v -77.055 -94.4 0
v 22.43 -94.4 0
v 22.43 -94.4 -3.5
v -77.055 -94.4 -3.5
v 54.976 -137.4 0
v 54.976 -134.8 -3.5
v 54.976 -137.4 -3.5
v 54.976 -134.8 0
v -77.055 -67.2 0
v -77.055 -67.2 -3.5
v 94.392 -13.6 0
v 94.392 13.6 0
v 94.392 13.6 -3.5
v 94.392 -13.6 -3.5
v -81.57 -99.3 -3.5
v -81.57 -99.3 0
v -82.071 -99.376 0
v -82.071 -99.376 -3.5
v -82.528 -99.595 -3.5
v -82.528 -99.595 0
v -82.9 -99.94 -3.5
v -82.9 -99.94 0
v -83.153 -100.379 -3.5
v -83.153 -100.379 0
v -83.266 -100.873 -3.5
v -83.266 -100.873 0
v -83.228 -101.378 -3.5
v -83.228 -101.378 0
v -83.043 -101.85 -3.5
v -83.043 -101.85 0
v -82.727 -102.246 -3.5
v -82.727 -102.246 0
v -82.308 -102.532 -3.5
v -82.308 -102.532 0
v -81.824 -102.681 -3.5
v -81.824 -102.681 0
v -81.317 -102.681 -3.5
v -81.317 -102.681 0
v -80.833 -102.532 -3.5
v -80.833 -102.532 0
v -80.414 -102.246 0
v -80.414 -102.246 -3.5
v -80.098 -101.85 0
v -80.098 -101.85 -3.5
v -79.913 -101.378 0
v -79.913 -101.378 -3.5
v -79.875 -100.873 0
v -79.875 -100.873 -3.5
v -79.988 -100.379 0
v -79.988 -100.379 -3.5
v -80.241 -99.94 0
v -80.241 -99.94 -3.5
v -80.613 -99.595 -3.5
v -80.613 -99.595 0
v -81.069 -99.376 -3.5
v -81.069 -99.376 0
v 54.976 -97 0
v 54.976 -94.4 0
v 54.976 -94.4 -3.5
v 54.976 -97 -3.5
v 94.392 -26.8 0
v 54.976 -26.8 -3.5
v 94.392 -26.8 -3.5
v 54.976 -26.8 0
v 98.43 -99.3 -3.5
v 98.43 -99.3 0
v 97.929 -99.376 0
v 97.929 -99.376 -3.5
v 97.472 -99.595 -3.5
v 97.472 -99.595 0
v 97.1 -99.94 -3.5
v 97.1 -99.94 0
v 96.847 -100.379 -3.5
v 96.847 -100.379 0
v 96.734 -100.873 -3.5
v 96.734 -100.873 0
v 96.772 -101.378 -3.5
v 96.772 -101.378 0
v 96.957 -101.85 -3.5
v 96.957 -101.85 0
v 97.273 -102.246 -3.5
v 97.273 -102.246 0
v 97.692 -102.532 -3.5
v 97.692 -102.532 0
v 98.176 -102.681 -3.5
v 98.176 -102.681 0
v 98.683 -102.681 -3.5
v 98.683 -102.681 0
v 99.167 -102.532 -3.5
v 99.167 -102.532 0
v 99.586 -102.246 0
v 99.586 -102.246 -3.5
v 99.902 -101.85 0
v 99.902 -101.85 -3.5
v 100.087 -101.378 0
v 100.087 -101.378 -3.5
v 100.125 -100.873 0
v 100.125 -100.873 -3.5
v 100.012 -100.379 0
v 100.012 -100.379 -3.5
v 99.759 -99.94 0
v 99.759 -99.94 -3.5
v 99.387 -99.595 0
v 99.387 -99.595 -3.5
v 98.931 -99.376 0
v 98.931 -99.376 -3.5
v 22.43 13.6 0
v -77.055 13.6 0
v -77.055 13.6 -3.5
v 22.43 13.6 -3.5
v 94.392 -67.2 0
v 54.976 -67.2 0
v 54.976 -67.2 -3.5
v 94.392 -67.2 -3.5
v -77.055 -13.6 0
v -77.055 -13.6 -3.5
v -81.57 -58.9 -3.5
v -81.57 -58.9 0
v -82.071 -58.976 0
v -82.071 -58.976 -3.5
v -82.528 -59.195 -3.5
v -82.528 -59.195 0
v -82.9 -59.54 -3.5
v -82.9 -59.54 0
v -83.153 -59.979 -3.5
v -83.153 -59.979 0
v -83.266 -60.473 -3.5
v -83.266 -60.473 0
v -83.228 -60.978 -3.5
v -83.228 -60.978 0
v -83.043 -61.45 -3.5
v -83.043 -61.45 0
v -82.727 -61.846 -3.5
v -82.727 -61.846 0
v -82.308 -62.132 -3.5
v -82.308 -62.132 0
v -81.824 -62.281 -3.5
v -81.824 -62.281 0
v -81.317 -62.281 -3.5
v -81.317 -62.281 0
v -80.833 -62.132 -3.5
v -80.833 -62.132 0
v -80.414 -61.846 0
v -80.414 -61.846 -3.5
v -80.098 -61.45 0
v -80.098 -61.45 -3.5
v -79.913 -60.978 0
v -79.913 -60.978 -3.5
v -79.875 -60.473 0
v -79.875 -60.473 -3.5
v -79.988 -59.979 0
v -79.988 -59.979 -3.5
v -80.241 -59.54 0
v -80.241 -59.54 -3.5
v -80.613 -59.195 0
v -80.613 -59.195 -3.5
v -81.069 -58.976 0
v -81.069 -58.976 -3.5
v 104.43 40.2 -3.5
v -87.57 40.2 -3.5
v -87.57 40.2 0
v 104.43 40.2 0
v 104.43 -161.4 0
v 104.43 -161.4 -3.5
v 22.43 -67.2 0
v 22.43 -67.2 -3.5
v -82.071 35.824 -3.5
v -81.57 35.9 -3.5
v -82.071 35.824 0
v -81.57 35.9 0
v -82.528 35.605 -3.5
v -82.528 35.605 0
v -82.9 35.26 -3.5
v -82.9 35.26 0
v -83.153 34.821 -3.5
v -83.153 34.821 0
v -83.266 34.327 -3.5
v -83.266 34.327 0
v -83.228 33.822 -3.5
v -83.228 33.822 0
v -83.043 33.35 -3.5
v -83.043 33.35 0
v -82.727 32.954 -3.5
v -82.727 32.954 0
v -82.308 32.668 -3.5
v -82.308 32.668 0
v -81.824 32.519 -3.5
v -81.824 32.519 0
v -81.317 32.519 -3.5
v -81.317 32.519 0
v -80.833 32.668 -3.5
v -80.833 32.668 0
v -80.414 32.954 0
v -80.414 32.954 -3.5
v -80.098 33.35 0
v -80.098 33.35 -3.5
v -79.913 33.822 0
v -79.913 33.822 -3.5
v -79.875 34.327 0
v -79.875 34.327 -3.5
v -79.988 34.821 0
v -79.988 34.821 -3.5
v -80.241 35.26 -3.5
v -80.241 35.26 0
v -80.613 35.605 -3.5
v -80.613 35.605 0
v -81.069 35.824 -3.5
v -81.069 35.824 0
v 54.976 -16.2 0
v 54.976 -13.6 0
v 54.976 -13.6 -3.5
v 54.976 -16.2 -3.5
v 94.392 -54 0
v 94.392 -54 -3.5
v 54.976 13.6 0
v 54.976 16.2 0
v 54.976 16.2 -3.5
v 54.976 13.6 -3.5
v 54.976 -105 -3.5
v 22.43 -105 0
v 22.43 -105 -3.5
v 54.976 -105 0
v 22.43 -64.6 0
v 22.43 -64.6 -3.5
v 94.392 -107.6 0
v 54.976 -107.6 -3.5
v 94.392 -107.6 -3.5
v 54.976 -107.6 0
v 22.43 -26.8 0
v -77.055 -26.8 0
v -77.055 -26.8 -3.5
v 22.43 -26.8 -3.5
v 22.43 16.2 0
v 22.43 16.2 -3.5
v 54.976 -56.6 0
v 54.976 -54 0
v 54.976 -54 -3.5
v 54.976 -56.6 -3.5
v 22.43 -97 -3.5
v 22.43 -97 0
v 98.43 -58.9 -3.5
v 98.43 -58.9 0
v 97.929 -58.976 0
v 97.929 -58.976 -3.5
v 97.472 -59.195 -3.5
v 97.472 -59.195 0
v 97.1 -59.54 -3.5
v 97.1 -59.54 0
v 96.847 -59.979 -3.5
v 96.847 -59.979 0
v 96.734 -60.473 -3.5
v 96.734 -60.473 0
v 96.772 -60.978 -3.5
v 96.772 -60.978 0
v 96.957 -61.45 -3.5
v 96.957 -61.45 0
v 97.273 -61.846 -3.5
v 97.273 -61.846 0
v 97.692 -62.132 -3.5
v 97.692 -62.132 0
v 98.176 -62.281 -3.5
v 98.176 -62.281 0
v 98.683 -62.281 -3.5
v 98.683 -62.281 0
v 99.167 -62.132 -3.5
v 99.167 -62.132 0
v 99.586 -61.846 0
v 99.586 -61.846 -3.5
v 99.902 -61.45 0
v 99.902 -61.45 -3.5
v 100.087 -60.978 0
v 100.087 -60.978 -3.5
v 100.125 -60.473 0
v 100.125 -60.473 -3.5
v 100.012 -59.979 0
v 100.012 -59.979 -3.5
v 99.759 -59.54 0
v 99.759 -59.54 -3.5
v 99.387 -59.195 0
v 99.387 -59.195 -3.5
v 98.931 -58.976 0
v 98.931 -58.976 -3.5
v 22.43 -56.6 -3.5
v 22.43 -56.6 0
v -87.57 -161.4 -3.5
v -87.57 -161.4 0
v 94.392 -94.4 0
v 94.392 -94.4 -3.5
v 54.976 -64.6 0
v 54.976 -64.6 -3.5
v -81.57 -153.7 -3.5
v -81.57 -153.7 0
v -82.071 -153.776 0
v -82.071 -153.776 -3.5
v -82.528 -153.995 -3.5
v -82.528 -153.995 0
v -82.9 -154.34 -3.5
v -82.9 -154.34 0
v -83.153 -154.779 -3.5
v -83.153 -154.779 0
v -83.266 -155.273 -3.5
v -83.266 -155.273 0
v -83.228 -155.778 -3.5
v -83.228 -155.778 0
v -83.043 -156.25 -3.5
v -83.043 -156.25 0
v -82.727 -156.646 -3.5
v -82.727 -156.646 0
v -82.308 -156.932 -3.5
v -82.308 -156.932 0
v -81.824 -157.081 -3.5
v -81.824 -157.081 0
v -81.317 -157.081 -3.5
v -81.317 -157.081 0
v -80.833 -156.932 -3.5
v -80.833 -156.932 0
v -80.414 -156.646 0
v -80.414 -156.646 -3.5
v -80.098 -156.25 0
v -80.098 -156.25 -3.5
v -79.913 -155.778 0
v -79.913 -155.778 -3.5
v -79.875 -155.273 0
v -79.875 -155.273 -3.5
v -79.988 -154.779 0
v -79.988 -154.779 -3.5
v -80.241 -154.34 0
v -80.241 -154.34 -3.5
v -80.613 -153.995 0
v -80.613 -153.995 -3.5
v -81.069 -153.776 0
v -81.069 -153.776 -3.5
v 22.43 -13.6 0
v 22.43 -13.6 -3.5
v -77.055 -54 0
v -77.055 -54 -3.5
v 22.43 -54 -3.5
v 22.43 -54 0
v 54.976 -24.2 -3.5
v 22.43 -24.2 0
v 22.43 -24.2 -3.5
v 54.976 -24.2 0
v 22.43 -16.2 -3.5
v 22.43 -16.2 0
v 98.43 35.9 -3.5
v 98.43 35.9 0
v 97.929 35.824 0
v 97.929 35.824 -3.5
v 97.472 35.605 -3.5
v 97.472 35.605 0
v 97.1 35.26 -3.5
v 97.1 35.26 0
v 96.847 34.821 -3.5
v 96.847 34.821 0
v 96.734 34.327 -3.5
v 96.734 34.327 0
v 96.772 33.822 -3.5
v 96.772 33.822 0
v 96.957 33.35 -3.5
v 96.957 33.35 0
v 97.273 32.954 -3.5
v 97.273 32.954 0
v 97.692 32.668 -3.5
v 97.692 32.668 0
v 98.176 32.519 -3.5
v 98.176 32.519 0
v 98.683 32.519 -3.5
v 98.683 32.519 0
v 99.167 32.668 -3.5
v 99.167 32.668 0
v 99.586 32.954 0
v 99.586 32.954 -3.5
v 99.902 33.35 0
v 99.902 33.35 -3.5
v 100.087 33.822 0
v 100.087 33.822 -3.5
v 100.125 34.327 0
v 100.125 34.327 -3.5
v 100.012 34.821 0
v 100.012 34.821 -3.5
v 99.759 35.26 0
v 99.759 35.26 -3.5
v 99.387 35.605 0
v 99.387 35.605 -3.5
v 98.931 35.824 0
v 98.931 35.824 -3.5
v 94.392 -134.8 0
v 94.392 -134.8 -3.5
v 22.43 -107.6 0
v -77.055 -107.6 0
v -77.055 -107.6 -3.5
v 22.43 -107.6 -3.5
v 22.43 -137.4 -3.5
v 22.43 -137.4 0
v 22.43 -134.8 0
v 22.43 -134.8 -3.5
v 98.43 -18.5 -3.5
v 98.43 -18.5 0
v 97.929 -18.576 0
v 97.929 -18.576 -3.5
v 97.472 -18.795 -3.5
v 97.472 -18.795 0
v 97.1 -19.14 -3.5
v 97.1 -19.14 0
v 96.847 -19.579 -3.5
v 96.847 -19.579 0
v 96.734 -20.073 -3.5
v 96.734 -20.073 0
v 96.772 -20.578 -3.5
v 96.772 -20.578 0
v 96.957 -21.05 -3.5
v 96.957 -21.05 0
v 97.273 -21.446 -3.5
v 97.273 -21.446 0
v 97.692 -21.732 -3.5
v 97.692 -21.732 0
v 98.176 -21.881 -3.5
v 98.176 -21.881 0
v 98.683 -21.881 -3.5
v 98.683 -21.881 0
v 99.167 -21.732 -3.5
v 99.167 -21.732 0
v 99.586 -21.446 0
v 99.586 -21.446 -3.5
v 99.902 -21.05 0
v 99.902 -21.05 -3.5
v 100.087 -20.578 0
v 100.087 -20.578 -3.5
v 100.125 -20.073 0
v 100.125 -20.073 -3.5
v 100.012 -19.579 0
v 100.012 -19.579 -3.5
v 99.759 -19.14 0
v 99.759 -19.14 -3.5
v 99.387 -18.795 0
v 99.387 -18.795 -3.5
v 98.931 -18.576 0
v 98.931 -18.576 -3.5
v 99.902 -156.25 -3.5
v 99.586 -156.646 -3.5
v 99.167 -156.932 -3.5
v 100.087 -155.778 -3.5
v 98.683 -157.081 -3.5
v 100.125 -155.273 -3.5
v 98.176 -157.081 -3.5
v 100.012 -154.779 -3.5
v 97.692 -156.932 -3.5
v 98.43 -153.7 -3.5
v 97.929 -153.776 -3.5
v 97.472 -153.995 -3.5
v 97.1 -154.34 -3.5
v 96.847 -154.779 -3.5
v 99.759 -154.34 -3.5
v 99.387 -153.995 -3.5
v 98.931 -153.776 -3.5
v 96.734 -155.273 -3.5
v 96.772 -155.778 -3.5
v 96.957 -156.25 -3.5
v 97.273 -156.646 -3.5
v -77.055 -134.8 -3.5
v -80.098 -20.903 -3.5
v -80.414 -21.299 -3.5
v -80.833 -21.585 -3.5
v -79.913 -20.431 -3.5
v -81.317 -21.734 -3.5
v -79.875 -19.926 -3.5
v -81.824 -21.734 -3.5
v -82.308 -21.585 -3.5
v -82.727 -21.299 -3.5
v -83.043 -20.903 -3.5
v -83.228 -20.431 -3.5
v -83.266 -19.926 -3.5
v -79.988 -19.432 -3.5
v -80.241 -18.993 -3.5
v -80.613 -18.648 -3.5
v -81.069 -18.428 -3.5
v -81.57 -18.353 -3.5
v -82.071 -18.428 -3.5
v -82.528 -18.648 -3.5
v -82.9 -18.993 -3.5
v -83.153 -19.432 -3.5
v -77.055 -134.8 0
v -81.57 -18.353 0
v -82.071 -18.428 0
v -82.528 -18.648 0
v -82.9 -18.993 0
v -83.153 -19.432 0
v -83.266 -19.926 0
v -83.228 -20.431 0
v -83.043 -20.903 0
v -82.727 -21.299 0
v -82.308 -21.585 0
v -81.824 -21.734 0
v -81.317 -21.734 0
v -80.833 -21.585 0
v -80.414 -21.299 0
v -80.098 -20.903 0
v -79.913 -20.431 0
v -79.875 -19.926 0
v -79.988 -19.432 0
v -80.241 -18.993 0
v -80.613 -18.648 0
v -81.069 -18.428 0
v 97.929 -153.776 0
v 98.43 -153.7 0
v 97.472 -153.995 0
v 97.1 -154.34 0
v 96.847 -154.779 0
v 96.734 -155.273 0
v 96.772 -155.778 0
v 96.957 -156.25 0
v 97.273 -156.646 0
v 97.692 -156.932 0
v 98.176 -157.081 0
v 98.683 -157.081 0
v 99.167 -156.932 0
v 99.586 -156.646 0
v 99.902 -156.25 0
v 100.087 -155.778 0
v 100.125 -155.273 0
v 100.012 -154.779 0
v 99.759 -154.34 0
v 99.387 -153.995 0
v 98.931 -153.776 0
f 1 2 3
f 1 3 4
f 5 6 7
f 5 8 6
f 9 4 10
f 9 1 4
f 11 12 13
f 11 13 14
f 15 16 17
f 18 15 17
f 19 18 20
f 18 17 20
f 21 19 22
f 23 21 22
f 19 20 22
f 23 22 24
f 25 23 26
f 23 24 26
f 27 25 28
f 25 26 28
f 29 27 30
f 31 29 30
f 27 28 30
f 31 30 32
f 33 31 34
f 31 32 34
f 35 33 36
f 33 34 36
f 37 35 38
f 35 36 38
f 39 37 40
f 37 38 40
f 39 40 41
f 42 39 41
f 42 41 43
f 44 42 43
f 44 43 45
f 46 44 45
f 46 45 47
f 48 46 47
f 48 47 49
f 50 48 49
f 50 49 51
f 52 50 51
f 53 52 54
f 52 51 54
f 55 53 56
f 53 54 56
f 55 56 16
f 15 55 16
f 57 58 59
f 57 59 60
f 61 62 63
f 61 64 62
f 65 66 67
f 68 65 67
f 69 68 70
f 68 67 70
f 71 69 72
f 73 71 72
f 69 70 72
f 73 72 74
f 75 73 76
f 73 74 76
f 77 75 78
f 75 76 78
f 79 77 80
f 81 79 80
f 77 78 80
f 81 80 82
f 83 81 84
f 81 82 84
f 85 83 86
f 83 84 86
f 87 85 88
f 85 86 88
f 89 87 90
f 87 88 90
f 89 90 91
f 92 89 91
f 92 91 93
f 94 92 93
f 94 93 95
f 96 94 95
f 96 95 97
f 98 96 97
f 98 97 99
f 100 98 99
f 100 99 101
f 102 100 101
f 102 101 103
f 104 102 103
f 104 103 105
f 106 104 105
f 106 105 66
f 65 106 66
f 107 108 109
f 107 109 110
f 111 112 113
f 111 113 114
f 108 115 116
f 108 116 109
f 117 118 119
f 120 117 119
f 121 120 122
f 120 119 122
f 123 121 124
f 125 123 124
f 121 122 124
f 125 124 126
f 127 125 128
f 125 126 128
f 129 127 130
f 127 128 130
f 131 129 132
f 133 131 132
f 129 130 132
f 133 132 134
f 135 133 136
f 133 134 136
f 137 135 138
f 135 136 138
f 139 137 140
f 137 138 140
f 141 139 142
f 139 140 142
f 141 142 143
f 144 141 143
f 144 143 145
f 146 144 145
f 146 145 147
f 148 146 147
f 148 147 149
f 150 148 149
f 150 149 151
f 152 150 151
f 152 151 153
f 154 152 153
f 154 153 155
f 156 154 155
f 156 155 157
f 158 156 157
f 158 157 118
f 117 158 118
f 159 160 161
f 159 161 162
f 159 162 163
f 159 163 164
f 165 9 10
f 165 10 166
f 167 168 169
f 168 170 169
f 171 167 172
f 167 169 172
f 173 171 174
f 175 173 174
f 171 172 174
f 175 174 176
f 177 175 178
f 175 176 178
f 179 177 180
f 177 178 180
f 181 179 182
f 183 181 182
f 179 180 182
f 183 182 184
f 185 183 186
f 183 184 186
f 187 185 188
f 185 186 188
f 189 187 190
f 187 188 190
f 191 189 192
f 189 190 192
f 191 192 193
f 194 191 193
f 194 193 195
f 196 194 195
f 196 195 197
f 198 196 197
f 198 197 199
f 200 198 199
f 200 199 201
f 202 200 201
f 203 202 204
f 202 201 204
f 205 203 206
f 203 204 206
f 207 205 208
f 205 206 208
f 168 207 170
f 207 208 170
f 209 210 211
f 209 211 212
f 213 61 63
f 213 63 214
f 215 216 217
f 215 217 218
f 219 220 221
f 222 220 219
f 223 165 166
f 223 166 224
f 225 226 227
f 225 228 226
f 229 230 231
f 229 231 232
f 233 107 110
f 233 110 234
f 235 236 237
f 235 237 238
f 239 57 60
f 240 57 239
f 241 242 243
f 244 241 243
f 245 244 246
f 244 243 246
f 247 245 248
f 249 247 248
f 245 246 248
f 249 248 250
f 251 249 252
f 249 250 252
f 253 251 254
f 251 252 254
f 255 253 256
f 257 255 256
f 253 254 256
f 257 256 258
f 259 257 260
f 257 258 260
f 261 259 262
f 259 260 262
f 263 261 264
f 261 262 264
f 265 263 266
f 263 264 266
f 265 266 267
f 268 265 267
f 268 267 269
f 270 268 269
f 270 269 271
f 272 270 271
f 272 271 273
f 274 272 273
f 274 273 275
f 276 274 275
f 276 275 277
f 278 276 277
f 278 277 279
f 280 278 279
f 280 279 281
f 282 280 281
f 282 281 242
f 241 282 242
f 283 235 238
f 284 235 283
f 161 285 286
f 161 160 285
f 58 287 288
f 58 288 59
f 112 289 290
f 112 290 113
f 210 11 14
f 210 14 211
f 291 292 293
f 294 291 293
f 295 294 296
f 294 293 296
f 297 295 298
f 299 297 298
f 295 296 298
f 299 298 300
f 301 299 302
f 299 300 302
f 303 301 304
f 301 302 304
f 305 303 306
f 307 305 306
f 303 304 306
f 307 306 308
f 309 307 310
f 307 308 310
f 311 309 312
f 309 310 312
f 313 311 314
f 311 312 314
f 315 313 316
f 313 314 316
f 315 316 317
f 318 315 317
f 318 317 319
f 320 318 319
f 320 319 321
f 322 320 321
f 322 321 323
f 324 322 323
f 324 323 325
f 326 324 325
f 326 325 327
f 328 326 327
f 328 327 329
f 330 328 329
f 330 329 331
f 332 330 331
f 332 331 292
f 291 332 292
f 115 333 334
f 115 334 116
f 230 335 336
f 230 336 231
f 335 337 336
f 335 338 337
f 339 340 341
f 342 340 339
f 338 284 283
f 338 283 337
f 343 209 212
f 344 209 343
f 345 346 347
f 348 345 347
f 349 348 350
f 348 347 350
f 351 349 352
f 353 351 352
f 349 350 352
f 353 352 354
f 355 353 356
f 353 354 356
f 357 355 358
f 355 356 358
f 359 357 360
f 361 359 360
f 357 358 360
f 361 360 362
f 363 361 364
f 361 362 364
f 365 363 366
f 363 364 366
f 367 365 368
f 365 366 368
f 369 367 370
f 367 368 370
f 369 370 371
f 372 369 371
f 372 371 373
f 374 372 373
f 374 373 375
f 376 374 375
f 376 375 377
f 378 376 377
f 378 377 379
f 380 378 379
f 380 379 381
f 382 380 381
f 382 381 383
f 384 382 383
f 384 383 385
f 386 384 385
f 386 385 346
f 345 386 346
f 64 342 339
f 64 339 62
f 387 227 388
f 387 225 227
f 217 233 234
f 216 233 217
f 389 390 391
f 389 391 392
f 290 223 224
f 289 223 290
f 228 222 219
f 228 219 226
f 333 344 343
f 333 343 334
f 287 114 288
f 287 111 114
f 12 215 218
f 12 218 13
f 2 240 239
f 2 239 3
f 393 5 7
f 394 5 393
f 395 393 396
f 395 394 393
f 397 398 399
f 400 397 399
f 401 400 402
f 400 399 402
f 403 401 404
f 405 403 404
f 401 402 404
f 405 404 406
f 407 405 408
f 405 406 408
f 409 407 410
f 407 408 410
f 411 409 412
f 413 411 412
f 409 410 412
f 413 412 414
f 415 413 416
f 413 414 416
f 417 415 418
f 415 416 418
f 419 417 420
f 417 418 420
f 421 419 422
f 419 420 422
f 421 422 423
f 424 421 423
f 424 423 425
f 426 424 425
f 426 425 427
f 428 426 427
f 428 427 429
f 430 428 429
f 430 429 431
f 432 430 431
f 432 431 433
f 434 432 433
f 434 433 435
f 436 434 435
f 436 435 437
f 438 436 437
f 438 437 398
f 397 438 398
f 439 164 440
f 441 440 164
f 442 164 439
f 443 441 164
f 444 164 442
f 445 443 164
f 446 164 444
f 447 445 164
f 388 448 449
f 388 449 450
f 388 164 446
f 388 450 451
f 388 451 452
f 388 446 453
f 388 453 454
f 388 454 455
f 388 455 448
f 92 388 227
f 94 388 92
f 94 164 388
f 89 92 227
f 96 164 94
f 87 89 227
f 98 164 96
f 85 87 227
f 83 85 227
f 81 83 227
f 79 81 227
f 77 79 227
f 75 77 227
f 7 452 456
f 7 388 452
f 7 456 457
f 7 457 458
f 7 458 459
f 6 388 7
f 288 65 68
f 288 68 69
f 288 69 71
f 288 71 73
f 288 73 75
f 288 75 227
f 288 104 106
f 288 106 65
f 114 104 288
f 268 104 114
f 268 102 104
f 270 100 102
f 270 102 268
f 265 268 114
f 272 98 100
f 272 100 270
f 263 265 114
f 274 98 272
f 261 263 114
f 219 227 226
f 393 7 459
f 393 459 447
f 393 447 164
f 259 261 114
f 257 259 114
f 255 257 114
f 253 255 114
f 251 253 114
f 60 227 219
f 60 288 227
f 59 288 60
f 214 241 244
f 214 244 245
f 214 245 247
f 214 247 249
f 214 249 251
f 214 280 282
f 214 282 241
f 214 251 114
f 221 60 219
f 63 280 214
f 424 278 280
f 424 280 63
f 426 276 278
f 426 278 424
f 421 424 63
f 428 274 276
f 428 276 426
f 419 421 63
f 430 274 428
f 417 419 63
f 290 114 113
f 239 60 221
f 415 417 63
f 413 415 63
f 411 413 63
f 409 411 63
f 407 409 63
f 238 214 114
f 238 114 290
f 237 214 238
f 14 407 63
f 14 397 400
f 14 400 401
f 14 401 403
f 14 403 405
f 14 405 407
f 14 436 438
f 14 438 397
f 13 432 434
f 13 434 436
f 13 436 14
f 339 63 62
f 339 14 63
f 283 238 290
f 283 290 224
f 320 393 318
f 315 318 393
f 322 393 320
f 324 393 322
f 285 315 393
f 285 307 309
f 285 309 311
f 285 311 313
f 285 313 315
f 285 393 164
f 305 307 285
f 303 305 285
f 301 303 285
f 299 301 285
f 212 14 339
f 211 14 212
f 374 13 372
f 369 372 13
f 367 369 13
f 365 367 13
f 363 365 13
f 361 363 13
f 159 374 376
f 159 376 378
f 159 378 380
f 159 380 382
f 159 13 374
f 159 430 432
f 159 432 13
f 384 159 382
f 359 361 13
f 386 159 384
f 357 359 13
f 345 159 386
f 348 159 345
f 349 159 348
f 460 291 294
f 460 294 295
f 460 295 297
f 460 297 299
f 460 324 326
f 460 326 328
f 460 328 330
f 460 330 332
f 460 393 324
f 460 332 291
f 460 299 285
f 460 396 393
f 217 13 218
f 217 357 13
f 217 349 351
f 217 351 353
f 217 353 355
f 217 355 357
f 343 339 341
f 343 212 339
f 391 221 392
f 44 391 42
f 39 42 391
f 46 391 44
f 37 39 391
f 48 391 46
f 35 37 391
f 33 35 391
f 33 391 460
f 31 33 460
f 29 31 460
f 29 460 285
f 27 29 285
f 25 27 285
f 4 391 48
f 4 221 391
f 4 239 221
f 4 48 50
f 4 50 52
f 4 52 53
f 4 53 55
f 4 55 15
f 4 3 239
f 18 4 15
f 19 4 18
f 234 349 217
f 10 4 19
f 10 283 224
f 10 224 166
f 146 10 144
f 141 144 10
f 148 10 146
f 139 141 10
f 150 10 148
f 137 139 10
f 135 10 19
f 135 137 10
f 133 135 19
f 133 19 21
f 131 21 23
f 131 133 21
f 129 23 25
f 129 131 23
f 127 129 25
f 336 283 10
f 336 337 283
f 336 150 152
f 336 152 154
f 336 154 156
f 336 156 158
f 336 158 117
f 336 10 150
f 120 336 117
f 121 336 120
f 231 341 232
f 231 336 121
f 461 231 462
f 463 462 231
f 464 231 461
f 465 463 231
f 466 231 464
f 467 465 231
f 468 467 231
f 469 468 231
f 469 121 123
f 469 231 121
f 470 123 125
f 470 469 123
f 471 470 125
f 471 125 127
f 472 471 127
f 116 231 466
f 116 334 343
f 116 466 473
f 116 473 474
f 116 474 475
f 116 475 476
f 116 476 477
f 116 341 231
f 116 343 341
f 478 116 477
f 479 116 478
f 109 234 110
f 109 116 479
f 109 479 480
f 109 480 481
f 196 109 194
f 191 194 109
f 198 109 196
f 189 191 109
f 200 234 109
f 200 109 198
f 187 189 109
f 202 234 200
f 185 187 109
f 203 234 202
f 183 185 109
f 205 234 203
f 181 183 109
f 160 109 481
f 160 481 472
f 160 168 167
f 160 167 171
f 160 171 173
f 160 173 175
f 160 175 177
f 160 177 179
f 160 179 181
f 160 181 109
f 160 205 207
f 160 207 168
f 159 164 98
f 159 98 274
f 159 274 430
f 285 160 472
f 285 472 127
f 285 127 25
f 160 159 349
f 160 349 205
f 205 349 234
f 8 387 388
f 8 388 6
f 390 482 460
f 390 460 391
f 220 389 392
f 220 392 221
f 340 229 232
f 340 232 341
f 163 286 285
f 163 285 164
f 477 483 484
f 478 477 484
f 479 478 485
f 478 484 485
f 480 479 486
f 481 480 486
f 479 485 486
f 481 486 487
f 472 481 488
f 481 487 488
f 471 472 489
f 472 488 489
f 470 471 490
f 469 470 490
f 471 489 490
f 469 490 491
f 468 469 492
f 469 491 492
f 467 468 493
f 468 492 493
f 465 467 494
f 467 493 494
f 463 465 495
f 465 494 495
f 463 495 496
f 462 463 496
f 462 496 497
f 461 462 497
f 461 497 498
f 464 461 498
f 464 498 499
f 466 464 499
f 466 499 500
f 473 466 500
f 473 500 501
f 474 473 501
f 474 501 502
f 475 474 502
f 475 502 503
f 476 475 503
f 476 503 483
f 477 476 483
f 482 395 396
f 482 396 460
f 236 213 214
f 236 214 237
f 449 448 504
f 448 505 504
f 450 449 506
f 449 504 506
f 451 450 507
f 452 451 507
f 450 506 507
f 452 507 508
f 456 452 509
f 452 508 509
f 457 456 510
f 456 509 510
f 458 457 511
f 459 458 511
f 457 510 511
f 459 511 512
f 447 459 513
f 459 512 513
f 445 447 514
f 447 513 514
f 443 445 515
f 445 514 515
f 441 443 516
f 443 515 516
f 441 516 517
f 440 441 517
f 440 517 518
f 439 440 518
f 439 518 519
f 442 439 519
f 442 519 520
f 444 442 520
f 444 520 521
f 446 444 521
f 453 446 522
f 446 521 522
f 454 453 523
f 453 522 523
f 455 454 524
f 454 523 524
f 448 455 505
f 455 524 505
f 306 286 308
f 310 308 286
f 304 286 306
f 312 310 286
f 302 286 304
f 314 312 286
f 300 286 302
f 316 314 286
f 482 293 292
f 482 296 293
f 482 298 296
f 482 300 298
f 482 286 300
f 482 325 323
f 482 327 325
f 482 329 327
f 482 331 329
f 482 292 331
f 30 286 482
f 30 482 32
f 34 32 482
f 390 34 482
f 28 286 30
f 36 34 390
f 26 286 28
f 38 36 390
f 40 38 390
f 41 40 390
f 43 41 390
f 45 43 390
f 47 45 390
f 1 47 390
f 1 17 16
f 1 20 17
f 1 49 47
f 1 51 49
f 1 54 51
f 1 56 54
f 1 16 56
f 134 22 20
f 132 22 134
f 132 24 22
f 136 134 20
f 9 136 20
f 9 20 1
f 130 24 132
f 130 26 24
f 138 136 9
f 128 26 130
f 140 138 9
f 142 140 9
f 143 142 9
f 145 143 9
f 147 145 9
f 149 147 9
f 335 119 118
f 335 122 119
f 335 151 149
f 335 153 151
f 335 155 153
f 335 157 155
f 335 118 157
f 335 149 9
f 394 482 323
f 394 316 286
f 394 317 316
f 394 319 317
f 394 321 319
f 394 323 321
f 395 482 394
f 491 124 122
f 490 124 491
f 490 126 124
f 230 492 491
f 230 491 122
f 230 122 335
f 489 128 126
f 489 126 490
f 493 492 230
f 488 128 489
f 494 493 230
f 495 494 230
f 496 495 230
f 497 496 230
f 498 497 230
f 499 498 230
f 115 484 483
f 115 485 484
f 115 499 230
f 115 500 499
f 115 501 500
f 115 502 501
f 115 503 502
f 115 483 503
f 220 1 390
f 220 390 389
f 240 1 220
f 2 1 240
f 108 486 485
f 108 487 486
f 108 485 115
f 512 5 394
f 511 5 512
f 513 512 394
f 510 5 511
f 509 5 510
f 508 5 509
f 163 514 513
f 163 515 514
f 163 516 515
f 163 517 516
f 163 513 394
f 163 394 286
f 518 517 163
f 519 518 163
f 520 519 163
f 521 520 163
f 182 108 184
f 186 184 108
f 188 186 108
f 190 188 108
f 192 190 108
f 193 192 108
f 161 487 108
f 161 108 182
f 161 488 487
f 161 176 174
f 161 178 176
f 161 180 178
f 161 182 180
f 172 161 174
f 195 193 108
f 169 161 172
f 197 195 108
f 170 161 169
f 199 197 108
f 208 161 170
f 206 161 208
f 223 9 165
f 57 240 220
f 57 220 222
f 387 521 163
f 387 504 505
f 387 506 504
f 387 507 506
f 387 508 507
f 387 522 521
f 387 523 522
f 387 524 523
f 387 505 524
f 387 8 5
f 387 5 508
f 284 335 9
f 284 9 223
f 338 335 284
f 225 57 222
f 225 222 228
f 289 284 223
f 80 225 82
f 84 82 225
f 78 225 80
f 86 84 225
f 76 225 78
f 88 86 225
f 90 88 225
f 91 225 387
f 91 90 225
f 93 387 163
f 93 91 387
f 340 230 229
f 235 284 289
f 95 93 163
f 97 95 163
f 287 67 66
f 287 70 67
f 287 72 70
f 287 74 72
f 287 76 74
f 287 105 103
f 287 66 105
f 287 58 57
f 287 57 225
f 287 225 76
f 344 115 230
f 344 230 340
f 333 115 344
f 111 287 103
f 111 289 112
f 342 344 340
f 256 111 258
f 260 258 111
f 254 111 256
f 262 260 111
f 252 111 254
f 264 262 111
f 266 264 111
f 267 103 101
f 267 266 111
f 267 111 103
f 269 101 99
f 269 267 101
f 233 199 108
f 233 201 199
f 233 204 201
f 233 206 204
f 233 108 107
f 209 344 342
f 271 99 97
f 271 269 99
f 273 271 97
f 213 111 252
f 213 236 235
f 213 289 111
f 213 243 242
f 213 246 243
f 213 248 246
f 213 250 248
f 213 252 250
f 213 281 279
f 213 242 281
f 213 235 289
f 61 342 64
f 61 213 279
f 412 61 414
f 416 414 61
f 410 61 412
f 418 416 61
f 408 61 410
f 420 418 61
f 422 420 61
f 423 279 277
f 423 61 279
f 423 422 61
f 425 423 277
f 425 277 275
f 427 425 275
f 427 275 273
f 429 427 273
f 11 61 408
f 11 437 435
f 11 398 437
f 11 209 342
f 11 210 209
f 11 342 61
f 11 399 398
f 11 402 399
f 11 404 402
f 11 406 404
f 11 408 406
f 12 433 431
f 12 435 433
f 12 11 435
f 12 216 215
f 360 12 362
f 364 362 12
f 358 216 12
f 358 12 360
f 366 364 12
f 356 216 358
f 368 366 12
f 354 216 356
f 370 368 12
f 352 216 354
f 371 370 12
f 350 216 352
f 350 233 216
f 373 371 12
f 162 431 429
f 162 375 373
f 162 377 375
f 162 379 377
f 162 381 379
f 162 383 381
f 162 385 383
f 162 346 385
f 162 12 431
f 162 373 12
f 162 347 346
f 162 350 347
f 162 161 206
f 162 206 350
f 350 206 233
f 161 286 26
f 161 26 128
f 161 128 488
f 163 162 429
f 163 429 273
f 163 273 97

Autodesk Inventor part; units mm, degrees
ref_plane "YZ Plane" through (0, 0, 0) normal (1, 0, 0) x (0, 1, 0)
ref_plane "XZ Plane" through (0, 0, 0) normal (0, 1, 0) x (-1, 0, 0)
ref_plane "XY Plane" through (0, 0, 0) normal (0, 0, 1) x (1, 0, 0)
sketch "Sketch1" plane through (0, 0, 0) normal (0, 0, 1) x (1, 0, 0)
  line L0 (93.3916, -12.6) -> (93.3916, 12.6)
  line L1 (53.9763, -12.6) -> (93.3916, -12.6)
  line L2 (53.9763, -15.2) -> (53.9763, -12.6)
  line L3 (38.2753, -15.2) -> (53.9763, -15.2)
  line L4 (38.2753, -15.2) -> (23.4296, -15.2)
  line L5 (23.4296, -12.6) -> (23.4296, -15.2)
  line L6 (-76.0546, -12.6) -> (23.4296, -12.6)
  line L7 (23.4296, 12.6) -> (-76.0546, 12.6)
  line L8 (23.4296, 15.2) -> (23.4296, 12.6)
  line L9 (-76.0546, 12.6) -> (-76.0546, -12.6)
  line L10 (-70.1, 10) -> (-66.9, 10)
  line L11 (-66.9, -10) -> (-70.1, -10)
  line L12 (23.4296, 15.2) -> (53.9763, 15.2)
  line L13 (53.9763, 15.2) -> (53.9763, 12.6)
  line L14 (53.9763, 12.6) -> (93.3916, 12.6)
  line L15 (-77.0546, 13.6) -> (22.4296, 13.6)
  line L16 (22.4296, 13.6) -> (22.4296, 16.2)
  line L17 (22.4296, 16.2) -> (54.9763, 16.2)
  line L18 (54.9763, 16.2) -> (54.9763, 13.6)
  line L19 (54.9763, 13.6) -> (94.3916, 13.6)
  line L20 (94.3916, 13.6) -> (94.3916, -13.6)
  line L21 (94.3916, -13.6) -> (54.9763, -13.6)
  line L22 (54.9763, -13.6) -> (54.9763, -16.2)
  line L23 (54.9763, -16.2) -> (38.2753, -16.2)
  line L24 (38.2753, -16.2) -> (22.4296, -16.2)
  line L25 (22.4296, -16.2) -> (22.4296, -13.6)
  line L26 (22.4296, -13.6) -> (-77.0546, -13.6)
  line L27 (-77.0546, -13.6) -> (-77.0546, 13.6)
  line L28 (22.4296, -16.2) -> (22.4296, -20.2) construction
  line L29 (22.4296, -20.2) -> (-87.5704, -20.2)
  line L30 (-87.5704, -20.2) -> (-87.5704, 20.2)
  line L31 (-87.5704, 20.2) -> (22.4296, 20.2)
  line L32 (104.4296, -20.2) -> (22.4296, -20.2)
  line L33 (22.4296, 20.2) -> (104.4296, 20.2)
  line L34 (104.4296, 20.2) -> (104.4296, -20.2)
  dimension "d0" = 1
  dimension "d1" = 4
  dimension "d2" = 110
  dimension "d3" = 40.4
  dimension "d5" = 82
extrude "Extrusion1" add sketch "Sketch1" against normal blind 3.5 contours L29 L30 L31 L33 L34 L32
pattern_linear "Rectangular Pattern1" count 4 spacing 40.4 along (0, -1, 0)
sketch "Sketch2" plane through (-87.5704, 20.2, 0) normal (0, 1, 0) x (1, 0, 0)
  line L0 (192, 3.5) -> (192, 0) projected
  line L1 (192, 0) -> (0, 0) projected
  line L2 (0, 0) -> (0, 3.5) projected
  line L3 (0, 3.5) -> (192, 3.5) projected
  point P0 (87.5704, 0)
extrude "Extrusion2" add sketch "Sketch2" along normal blind 20
sketch "Sketch3" plane through (-87.5704, -141.4, 0) normal (0, -1, 0) x (1, 0, 0)
  line L0 (192, 0) -> (192, -3.5) projected
  line L1 (192, -3.5) -> (0, -3.5) projected
  line L2 (0, -3.5) -> (0, 0) projected
  line L3 (0, 0) -> (192, 0) projected
  point P0 (87.5704, 0)
extrude "Extrusion3" add sketch "Sketch3" along normal blind 20
sketch "Sketch4" plane through (0, 0, -3.5) normal (0, 0, -1) x (-1, 0, 0)
  line L0 (87.5704, -161.4) -> (-104.4296, -161.4) projected
  line L1 (87.5704, -161.4) -> (81.5704, -161.4)
  line L2 (81.5704, -161.4) -> (81.5704, 40.2)
  line L3 (-104.4296, 40.2) -> (87.5704, 40.2) projected
  line L4 (81.5704, -161.4) -> (81.5704, -155.4)
  line L5 (81.5704, 40.2) -> (81.5704, 34.2)
  line L6 (77.0546, -107.6) -> (-22.4296, -107.6) projected
  line L7 (77.0546, -67.2) -> (77.0546, -94.4) projected
  line L8 (77.0546, -107.6) -> (77.0546, -94.4)
  line L9 (77.0546, -101) -> (81.5704, -101)
  line L10 (77.0546, -67.2) -> (77.0546, -53.8327)
  line L11 (77.0546, -60.5163) -> (81.5704, -60.6)
  line L12 (77.0546, -54) -> (77.0546, -26.8) projected
  line L13 (77.0546, -26.8) -> (77.0546, -13.3059)
  line L14 (77.0546, -20.0529) -> (81.5704, -20.0529)
  line L15 (-94.3916, -107.6) -> (-54.9763, -107.6) projected
  line L16 (-94.3916, -67.2) -> (-94.3916, -94.4) projected
  line L17 (-94.3916, -107.6) -> (-94.3916, -94.4)
  line L18 (-54.9763, -54) -> (-94.3916, -54) projected
  line L19 (-94.3916, -67.2) -> (-94.3916, -54)
  line L20 (-54.9763, -13.6) -> (-94.3916, -13.6) projected
  line L21 (-94.3916, -13.6) -> (-94.3916, 13.6) projected
  line L22 (-94.3916, -13.6) -> (-94.3916, 13.6)
  line L23 (-104.4296, -161.4) -> (-98.4296, -161.4)
  line L24 (-98.4296, -161.4) -> (-98.4296, 40.2)
  line L25 (-94.3916, -101) -> (-98.4296, -101)
  line L26 (-94.3916, -60.6) -> (-98.4296, -60.6)
  line L27 (-94.3916, -26.8) -> (-94.3916, -13.6)
  line L28 (-94.3916, -20.2) -> (-98.4296, -20.2)
  line L29 (-98.4296, 40.2) -> (-98.4296, 34.2)
  line L30 (-98.4296, -161.4) -> (-98.4296, -155.4)
  point P0 (0, 0)
  dimension "d15" = 6
  dimension "d16" = 6
  dimension "d17" = 6
  dimension "d18" = 6
  dimension "d19" = 6
  dimension "d20" = 6
hole "Hole1" at (98.4296, -155.4, -3.5) at (98.4296, -155.4, -3.5) at (98.4296, -101, -3.5) at (98.4296, -60.6, -3.5) at (98.4296, -20.2, -3.5) at (98.4296, 34.2, -3.5) at (-81.5704, 34.2, -3.5) at (-81.5704, -20.0529, -3.5) at (-81.5704, -60.6, -3.5) at (-81.5704, -101, -3.5) at (-81.5704, -155.4, -3.5) direction (0, 0, 1) diameter 3.4 end through all clearance for "Flat Head Machine Screw" size "M3" standard "Ansi Metric M Profile"
properties part number "UnderPlate-4x1"
